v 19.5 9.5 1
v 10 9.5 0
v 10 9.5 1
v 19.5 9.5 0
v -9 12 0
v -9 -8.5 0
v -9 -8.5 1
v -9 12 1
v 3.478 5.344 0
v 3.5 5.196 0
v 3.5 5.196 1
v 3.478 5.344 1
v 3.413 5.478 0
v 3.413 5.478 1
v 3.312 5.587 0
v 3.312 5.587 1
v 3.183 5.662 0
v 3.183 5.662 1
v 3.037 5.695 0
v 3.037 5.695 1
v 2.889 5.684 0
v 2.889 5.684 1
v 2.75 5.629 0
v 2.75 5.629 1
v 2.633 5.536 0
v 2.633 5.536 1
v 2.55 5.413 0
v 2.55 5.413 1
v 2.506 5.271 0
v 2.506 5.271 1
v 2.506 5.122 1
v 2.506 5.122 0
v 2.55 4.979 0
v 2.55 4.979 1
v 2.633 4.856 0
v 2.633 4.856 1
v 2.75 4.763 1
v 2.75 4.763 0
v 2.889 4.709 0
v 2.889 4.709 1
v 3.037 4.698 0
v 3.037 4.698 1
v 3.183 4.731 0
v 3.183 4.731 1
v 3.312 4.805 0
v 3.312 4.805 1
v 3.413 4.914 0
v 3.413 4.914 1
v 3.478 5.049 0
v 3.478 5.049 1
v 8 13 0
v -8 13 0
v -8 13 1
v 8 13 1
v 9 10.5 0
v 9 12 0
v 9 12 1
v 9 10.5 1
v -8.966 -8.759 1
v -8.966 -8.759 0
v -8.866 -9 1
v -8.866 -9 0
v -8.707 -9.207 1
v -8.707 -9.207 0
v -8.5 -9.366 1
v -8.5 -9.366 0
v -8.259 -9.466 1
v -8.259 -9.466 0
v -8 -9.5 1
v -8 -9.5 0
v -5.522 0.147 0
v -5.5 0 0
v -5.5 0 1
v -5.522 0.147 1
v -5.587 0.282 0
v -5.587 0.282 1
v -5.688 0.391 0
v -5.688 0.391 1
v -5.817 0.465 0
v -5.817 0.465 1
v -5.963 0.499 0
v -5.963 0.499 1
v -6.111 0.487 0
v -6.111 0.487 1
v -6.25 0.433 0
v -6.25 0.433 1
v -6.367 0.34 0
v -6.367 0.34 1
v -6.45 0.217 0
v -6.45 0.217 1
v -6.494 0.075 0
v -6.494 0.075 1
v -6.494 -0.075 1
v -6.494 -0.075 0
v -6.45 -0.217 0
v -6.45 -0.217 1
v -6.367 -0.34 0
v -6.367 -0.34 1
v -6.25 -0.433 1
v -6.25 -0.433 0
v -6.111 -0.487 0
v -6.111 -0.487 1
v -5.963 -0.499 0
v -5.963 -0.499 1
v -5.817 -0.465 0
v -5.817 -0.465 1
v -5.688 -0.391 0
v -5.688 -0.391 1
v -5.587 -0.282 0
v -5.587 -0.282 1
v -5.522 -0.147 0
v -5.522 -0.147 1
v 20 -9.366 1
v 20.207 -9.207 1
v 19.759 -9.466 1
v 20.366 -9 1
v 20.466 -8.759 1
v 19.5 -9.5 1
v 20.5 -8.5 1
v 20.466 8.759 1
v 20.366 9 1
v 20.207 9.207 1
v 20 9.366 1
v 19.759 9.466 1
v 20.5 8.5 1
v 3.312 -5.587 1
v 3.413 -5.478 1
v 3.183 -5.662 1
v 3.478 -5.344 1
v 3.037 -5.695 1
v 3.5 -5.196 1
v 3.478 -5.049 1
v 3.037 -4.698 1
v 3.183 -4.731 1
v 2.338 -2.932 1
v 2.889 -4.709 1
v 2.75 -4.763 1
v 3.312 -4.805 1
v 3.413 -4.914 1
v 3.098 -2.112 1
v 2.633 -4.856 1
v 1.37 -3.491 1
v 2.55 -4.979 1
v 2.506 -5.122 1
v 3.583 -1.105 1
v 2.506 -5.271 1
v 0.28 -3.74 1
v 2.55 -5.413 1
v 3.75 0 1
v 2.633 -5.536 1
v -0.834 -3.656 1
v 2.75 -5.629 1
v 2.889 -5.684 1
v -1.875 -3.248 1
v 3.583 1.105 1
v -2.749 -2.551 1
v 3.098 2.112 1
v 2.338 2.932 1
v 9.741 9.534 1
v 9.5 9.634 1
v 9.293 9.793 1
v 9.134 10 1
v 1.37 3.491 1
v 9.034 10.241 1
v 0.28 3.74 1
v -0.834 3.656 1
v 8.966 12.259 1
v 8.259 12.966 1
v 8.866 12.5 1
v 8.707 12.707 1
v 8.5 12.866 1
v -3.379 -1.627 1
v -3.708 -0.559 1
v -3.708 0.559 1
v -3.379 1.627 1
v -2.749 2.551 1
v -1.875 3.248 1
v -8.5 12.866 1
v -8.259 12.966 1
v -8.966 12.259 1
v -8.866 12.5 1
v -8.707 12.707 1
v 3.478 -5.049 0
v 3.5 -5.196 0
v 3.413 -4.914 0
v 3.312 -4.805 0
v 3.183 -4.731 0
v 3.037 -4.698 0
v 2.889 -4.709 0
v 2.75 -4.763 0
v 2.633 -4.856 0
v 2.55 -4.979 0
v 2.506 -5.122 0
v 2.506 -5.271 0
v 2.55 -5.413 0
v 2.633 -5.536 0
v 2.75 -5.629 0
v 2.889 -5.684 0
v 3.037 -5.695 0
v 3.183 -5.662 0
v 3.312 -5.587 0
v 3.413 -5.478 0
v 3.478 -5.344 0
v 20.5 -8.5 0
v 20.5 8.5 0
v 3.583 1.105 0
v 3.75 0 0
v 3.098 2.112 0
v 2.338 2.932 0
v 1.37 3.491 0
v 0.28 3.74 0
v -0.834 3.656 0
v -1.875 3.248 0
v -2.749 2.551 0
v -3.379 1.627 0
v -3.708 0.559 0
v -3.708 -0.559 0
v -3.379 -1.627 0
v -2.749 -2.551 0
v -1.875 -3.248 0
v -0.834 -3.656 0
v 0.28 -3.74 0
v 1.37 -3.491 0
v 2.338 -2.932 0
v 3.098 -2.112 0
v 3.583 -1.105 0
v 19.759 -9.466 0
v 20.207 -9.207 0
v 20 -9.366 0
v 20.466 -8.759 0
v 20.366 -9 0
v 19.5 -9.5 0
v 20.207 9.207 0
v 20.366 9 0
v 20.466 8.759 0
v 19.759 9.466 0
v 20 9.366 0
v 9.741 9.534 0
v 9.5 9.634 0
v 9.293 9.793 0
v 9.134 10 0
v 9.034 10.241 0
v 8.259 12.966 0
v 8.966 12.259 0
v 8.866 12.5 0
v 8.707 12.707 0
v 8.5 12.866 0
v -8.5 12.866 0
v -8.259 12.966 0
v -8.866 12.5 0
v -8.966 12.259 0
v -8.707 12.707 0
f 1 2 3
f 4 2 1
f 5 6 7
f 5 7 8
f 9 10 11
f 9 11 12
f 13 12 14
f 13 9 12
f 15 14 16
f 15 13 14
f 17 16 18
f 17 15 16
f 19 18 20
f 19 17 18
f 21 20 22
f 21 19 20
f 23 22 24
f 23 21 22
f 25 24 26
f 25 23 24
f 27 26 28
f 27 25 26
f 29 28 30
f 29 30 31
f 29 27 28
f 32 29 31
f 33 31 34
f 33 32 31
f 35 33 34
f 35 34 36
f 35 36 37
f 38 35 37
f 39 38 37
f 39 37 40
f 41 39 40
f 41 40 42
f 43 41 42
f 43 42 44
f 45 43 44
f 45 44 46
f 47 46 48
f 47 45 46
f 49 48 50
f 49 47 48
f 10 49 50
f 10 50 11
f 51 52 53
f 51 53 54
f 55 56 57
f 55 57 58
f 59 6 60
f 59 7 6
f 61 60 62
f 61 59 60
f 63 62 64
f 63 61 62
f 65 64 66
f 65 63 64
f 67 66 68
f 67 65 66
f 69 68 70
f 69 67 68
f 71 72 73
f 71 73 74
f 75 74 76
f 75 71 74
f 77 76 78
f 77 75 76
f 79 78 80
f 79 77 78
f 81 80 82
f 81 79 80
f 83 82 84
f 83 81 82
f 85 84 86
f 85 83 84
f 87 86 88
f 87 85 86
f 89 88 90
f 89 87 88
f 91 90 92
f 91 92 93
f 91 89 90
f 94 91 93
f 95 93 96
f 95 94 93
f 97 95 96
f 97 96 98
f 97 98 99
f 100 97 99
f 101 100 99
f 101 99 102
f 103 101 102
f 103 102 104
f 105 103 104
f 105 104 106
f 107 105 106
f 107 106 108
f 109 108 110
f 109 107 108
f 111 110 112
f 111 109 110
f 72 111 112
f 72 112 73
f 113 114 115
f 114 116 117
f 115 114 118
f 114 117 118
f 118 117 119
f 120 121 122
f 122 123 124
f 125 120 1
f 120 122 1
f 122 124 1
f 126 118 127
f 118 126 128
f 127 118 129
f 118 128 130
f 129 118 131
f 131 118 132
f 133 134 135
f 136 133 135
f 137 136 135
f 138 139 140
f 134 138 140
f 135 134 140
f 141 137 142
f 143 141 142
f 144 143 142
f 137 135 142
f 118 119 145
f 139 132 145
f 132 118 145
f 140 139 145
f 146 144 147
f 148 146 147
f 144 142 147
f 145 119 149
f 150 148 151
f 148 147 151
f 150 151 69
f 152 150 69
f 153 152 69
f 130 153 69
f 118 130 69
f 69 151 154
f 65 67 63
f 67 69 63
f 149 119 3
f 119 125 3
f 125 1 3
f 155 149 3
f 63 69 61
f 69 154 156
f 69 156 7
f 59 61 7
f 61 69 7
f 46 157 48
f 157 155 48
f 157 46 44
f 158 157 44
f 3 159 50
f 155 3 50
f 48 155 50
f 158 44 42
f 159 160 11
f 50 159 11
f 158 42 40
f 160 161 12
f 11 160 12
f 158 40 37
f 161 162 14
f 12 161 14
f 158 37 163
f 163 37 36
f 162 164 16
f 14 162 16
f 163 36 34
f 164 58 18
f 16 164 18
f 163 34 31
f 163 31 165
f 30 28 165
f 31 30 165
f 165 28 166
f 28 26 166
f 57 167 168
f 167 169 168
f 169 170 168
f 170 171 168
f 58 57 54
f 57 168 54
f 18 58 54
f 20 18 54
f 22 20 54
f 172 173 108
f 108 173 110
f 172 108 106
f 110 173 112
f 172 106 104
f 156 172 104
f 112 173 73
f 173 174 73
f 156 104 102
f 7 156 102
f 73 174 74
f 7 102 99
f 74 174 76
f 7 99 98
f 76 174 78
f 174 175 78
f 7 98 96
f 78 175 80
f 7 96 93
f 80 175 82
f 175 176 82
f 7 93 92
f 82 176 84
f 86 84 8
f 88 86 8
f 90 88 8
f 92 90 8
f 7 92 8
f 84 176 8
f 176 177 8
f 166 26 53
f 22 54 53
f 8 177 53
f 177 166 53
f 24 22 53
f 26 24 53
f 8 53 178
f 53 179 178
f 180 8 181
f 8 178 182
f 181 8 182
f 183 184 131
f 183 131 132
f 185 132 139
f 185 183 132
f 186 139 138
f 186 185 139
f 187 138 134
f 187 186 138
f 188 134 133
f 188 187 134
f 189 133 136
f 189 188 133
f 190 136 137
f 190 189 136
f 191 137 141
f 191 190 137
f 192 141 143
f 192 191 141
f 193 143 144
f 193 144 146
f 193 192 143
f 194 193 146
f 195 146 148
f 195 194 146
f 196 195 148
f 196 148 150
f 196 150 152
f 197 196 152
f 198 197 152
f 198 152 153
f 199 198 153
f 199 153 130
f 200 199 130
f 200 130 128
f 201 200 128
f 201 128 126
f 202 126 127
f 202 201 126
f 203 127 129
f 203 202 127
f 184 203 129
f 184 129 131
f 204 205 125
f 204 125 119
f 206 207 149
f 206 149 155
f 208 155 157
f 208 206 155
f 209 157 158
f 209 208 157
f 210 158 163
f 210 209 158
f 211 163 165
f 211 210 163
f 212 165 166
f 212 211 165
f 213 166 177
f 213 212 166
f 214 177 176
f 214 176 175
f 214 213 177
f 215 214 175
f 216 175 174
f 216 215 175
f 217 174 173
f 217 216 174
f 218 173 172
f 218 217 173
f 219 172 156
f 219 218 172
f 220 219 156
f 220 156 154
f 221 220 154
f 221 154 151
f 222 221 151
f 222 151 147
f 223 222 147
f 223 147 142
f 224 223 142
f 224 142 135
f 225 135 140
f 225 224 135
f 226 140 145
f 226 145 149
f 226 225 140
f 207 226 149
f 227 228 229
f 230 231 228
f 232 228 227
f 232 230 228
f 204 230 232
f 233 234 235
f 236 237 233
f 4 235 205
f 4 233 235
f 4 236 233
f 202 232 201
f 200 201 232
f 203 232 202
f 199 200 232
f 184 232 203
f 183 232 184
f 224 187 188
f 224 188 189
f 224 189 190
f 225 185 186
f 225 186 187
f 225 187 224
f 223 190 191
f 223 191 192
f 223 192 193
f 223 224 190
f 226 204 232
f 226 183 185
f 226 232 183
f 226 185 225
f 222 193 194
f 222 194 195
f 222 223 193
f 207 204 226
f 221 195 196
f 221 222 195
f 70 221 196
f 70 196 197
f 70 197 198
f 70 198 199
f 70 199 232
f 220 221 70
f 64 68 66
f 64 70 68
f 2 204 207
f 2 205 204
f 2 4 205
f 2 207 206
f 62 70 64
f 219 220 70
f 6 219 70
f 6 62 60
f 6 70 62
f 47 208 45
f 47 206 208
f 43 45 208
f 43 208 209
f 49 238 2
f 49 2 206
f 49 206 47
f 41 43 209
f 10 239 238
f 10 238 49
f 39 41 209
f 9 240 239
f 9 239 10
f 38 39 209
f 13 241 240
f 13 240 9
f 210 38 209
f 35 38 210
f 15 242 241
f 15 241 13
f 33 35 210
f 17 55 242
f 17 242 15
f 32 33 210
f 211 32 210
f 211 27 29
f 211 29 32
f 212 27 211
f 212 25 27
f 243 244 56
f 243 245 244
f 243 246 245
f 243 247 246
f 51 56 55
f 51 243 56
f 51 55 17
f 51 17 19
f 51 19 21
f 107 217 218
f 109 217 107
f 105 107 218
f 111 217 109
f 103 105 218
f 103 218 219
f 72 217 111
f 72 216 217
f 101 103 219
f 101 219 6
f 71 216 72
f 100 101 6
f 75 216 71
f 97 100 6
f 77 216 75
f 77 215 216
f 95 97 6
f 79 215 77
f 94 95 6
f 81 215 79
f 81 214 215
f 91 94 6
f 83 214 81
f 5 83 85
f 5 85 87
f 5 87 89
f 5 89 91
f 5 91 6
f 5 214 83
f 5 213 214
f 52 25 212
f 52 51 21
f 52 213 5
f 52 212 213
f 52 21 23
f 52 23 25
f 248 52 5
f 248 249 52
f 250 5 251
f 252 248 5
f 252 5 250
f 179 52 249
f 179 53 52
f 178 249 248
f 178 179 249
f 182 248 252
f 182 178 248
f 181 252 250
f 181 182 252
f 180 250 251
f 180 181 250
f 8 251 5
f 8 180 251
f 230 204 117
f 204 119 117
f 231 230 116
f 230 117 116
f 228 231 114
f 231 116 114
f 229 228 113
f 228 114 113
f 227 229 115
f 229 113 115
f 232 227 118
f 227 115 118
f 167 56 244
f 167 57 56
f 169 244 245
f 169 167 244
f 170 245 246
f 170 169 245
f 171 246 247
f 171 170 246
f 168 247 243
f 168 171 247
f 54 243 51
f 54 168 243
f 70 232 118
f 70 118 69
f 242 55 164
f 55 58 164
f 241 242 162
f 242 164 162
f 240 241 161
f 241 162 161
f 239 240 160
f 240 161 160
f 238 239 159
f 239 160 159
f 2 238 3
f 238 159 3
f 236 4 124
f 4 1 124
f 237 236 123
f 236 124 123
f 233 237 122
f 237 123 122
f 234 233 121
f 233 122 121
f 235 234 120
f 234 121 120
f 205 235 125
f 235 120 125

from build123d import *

# Parameters (mm, degrees)
BOARDSKE_R   = 0.5
BOARDSKE_R_2 = 3.75
BOARD_DEPTH  = 1
FILLET_2_R   = 1


with BuildPart() as part:
    # BoardSke → Board (new body)
    with BuildSketch(Plane.XY):
        Polygon((9, 13), (9, 9.5), (20.5, 9.5), (20.5, -9.5), (-9, -9.5), (-9, 13), align=None)
        with Locations((-6, 0)):
            Circle(BOARDSKE_R, mode=Mode.SUBTRACT)
        Circle(BOARDSKE_R_2, mode=Mode.SUBTRACT)
        with Locations((3, 5.196152423)):
            Circle(BOARDSKE_R, mode=Mode.SUBTRACT)
        with Locations((3, -5.196152423)):
            Circle(BOARDSKE_R, mode=Mode.SUBTRACT)
    extrude(amount=BOARD_DEPTH)

    # Fillet 2
    fillet_2_edges = [part.edges().sort_by_distance(p)[0] for p in [
        (9, 13, 0.5),
        (9, 9.5, 0.5),
        (20.5, 9.5, 0.5),
        (20.5, -9.5, 0.5),
        (-9, -9.5, 0.5),
        (-9, 13, 0.5),
    ]]
    fillet(fillet_2_edges, radius=FILLET_2_R)


solid = part.part
